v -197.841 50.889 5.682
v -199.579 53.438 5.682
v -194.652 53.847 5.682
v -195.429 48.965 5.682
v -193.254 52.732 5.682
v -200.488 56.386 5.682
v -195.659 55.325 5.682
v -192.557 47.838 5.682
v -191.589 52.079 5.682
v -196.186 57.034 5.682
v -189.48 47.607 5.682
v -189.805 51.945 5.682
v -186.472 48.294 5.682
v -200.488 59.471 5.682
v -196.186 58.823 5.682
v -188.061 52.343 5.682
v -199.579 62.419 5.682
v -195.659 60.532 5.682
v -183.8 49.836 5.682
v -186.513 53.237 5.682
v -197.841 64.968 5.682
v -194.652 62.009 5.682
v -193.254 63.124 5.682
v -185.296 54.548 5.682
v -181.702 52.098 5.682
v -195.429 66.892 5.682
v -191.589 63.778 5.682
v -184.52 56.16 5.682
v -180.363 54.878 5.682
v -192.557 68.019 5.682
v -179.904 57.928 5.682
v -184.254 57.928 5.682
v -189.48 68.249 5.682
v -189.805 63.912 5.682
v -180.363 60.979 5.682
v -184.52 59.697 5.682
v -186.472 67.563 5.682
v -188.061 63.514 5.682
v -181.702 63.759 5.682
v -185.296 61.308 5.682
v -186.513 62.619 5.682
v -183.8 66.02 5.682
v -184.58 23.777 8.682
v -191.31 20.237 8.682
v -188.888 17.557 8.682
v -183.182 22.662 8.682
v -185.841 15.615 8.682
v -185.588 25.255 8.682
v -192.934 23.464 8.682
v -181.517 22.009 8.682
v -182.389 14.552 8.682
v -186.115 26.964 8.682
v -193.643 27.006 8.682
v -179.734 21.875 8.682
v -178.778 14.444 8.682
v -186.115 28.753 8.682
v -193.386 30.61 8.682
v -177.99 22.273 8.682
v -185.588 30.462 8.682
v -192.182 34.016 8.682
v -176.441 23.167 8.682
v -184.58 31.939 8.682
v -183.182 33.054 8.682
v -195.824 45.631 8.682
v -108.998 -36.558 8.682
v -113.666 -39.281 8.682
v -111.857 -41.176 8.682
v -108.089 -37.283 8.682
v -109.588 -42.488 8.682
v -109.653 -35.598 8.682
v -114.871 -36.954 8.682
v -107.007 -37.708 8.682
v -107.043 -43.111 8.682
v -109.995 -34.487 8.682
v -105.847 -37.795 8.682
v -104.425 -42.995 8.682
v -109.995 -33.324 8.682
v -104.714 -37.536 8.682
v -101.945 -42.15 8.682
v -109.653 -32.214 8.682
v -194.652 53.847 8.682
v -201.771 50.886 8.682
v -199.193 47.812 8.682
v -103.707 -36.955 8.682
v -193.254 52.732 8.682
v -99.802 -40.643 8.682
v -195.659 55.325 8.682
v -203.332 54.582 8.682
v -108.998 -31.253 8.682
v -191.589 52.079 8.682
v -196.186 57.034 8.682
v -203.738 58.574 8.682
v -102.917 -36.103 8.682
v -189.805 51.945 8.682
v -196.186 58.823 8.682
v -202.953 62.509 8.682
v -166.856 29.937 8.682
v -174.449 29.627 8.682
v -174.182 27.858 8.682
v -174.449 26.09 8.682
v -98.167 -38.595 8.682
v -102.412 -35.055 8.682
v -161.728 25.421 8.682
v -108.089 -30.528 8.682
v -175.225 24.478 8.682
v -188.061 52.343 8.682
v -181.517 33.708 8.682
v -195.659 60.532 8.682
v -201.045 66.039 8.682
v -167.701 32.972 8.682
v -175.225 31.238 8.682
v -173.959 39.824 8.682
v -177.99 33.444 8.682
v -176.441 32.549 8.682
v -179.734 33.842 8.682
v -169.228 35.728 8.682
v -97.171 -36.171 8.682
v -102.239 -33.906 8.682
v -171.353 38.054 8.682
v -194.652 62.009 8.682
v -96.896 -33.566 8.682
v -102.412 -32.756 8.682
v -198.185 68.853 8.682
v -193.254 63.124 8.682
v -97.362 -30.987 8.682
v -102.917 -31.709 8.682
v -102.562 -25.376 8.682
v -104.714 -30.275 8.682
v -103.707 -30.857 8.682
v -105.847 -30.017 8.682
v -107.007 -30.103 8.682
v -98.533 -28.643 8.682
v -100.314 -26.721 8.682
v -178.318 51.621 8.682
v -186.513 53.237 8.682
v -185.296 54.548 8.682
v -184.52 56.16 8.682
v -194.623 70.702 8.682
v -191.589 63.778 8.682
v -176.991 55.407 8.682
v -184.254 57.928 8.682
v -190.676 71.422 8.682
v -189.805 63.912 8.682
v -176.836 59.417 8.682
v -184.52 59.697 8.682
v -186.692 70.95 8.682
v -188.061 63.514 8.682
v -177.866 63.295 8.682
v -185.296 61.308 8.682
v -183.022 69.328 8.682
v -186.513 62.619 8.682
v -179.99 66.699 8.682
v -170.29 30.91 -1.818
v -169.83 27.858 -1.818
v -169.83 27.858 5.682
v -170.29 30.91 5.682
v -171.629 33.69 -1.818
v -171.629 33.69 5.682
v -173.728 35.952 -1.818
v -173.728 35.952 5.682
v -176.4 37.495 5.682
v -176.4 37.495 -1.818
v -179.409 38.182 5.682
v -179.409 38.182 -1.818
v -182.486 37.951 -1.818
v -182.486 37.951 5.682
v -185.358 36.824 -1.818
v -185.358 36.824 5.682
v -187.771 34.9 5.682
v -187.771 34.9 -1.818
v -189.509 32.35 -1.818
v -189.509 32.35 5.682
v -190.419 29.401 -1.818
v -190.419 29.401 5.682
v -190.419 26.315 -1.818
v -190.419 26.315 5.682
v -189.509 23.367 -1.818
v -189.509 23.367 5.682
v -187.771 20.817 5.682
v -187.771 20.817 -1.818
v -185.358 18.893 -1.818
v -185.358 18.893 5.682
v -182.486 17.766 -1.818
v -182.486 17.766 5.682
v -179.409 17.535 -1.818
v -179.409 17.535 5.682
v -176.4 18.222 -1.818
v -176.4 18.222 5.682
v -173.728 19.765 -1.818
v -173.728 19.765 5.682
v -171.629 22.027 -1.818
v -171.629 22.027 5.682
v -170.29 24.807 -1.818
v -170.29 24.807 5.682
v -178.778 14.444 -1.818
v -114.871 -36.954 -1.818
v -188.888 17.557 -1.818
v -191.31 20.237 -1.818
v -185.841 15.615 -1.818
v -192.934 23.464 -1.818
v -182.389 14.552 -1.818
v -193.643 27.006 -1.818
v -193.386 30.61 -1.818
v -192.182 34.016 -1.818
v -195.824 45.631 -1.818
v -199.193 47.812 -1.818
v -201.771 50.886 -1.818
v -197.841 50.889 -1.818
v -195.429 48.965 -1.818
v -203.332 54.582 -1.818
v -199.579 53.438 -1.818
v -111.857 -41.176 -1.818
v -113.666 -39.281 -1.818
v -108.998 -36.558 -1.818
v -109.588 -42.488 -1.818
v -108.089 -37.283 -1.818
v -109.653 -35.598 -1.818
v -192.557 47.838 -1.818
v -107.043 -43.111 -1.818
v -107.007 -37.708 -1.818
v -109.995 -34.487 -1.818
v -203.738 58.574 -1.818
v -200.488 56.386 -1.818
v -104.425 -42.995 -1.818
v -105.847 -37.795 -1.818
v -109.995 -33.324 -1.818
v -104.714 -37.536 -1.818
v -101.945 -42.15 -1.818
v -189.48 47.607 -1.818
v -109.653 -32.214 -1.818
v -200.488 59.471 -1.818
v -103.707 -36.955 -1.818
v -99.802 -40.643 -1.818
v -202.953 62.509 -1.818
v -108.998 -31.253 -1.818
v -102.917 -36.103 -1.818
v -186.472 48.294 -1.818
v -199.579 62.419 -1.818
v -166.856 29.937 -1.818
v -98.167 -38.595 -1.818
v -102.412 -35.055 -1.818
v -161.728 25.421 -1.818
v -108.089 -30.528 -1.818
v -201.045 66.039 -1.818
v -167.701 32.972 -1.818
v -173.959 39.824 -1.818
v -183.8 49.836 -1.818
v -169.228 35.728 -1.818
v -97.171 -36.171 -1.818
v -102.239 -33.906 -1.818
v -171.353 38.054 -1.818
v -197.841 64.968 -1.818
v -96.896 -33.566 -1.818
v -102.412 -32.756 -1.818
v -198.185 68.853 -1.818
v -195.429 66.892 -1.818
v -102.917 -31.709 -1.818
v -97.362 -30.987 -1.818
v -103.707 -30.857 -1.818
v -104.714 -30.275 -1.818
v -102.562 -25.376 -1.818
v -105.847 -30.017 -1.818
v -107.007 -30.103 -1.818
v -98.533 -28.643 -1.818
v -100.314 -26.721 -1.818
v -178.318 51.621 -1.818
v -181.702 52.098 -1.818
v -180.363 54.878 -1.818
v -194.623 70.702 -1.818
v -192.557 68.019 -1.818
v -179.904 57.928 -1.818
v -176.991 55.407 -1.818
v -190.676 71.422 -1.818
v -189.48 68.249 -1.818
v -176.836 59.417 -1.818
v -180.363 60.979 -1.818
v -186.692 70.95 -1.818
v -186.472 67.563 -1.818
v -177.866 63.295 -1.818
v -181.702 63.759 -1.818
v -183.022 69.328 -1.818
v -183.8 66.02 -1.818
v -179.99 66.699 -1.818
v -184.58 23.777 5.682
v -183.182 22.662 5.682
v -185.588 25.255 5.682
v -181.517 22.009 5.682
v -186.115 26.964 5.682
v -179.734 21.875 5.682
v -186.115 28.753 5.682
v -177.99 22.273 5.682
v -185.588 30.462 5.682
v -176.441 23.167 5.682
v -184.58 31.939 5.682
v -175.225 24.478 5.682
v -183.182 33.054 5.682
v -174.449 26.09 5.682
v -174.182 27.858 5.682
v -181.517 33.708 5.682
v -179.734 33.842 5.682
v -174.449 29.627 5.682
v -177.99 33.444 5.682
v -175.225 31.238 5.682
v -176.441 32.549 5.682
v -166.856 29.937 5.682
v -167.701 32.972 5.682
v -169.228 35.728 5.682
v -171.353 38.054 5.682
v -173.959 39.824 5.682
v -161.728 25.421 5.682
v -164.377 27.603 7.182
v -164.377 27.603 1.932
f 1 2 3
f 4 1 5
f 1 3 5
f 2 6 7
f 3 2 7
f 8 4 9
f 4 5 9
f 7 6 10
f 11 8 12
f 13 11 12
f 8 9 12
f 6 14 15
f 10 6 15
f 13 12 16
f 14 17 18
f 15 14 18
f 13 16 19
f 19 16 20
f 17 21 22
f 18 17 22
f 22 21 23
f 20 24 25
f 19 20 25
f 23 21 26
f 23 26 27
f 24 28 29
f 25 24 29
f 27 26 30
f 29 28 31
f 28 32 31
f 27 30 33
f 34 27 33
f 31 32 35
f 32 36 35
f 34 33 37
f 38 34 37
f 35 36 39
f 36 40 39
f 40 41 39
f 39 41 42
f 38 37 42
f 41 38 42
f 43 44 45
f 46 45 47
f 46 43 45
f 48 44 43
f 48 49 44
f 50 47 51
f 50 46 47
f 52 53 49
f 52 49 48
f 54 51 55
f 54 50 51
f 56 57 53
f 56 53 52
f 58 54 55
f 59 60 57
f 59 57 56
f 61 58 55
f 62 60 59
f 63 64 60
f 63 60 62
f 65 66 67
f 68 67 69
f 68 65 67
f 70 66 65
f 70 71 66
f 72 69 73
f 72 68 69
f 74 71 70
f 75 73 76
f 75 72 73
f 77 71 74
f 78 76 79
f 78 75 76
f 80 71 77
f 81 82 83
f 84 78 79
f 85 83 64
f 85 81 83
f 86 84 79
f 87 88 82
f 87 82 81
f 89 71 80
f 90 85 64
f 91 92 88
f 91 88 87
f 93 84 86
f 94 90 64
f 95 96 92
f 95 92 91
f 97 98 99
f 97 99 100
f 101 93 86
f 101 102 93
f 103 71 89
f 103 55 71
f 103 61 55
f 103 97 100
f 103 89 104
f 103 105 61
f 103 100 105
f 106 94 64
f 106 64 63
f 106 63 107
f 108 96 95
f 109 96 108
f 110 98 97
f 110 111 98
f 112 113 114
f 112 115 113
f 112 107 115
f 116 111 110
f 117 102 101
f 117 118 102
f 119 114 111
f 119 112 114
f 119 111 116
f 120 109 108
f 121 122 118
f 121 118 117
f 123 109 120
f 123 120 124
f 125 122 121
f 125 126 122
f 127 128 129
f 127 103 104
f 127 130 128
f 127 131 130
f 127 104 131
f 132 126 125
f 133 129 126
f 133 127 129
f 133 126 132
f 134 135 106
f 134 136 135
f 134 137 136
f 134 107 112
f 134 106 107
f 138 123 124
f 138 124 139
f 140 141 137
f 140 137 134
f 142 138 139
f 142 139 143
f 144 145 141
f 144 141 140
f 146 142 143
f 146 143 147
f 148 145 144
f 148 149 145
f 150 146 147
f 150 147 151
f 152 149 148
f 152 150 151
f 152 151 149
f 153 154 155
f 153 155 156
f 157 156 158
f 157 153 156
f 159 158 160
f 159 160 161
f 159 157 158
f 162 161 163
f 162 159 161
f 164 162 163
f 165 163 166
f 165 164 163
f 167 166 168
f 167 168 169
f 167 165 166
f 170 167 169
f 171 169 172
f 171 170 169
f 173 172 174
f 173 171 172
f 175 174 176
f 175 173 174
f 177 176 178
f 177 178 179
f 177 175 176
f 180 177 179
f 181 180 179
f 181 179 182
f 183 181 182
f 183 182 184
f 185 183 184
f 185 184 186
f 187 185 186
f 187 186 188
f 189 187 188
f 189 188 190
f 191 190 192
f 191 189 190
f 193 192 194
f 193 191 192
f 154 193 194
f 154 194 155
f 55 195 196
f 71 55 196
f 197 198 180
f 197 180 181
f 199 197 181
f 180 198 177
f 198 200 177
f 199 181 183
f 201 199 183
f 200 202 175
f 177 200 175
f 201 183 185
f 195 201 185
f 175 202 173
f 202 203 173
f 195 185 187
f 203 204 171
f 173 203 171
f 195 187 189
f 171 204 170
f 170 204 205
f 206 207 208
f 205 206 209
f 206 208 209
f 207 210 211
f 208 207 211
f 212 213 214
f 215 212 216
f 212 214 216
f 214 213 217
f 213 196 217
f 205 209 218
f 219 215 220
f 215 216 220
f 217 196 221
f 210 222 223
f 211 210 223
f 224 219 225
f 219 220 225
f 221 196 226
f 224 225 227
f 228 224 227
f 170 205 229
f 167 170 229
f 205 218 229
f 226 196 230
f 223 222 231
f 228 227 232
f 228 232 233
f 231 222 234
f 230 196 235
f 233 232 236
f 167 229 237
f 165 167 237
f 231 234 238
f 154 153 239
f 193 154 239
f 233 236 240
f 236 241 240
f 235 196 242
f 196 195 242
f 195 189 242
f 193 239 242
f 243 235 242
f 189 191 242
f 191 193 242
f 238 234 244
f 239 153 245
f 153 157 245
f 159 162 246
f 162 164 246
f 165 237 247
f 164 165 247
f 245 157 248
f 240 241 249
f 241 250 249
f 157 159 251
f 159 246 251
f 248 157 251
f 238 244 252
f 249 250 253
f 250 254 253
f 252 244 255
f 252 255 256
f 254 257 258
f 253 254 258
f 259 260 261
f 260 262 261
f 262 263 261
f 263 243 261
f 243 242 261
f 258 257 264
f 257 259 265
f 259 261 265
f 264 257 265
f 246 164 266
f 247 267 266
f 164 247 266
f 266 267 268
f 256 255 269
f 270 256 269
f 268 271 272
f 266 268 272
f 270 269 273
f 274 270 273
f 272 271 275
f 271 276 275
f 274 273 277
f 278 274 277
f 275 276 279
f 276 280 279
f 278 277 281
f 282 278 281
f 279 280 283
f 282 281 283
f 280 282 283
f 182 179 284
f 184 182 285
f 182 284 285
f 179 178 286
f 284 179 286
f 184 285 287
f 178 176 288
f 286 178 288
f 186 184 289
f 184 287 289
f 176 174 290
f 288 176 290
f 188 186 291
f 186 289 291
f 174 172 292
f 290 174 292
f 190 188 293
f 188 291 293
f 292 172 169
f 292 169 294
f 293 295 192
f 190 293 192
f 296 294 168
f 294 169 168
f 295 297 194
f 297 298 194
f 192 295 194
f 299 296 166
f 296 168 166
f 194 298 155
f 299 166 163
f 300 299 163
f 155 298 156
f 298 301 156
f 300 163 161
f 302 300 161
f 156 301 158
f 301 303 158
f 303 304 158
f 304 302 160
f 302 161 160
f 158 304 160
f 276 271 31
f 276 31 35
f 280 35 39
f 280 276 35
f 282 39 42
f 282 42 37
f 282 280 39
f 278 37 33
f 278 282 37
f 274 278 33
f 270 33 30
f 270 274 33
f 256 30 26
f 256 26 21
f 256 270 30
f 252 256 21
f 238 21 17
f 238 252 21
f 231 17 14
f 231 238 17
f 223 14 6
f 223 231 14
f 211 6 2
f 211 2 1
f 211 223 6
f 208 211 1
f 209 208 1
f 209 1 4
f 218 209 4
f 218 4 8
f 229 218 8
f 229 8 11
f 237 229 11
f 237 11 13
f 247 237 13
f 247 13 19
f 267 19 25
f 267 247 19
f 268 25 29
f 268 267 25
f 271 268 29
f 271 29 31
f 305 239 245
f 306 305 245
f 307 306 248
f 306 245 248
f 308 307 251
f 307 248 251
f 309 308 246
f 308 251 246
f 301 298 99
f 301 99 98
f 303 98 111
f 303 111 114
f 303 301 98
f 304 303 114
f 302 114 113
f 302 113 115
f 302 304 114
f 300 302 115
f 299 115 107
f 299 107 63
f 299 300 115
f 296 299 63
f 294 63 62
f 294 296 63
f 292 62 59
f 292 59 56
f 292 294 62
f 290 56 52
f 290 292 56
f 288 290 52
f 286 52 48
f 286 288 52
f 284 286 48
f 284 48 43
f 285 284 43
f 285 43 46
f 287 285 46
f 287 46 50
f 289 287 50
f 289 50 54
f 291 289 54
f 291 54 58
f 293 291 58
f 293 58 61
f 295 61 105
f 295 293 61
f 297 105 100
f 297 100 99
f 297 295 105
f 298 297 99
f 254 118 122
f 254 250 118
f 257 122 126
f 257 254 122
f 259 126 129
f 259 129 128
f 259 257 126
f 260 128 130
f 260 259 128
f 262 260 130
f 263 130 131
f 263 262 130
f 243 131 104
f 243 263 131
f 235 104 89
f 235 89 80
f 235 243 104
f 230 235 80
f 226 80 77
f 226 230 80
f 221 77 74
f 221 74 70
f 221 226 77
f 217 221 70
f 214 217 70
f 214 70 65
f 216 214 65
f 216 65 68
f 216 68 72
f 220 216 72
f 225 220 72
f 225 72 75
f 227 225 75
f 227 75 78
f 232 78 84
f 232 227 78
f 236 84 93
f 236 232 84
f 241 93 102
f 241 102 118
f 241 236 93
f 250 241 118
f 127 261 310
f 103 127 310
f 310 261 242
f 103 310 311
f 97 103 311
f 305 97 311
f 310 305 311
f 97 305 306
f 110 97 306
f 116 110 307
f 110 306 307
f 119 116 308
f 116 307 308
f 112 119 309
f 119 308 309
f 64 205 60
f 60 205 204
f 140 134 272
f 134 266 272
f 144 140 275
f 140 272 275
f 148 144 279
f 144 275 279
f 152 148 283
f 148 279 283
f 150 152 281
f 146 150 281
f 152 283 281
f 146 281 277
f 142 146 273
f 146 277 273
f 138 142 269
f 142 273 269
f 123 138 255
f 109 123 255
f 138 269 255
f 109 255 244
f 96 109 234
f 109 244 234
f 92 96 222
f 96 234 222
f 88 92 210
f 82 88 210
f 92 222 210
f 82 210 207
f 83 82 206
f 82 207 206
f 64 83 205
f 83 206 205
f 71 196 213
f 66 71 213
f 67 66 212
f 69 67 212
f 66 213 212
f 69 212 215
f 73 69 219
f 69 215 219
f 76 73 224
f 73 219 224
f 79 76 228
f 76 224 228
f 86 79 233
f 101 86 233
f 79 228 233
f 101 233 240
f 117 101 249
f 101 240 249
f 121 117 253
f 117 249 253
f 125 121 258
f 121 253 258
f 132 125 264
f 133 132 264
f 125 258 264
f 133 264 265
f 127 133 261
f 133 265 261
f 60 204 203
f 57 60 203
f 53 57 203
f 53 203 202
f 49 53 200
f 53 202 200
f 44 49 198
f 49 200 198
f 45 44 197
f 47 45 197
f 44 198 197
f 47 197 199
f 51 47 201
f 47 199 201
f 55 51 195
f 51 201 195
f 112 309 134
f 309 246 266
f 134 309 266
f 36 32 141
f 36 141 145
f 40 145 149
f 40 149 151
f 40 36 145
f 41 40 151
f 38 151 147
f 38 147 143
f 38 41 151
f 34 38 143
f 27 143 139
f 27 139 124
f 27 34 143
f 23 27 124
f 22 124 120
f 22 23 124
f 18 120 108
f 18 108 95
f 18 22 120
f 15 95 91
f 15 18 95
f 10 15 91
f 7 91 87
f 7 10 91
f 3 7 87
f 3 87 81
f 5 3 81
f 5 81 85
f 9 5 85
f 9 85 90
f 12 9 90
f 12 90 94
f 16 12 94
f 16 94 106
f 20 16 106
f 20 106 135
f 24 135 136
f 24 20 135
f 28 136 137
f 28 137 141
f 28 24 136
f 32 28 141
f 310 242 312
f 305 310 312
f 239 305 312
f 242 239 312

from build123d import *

# Parameters (mm, degrees)
SKETCH1_R           = 6.901519969
SKETCH1_R_2         = 6.9
SKETCH1_R_3         = 2.6
BOSS_EXTRUDE1_DEPTH = 5
SKETCH2_R           = 4
SKETCH2_R_2         = 2.6
BOSS_EXTRUDE2_DEPTH = 2
SCALE1_SCALE        = 1.5


with BuildPart() as part:
    # Sketch1 → Boss-Extrude1 (new body)
    with BuildSketch(Plane.XY):
        with BuildLine():
            Line((-119.047770685, -14.21840763), (-158.491736924, 19.646141241))
            add(Edge.make_bspline(
                [(-158.491736924, 19.646141241), (-160.313597407, 21.050397122), (-161.909962094, 22.656519407)],
                knots=[0, 0, 0, 1, 1, 1], degree=2))
            ThreePointArc((-161.909962094, 22.656519407), (-163.491640093, 26.517106064), (-166.64545249, 29.248278339))
            Line((-166.64545249, 29.248278339), (-169.551288031, 37.112526103))
            ThreePointArc((-169.551288031, 37.112526103), (-180.421756419, 49.833075564), (-181.222431589, 33.119656379))
            Line((-181.222431589, 33.119656379), (-178.794316039, 25.37582765))
            ThreePointArc((-178.794316039, 25.37582765), (-178.212831269, 16.189990788), (-169.857983808, 12.328093938))
            Line((-169.857983808, 12.328093938), (-127.253789064, -21.937441374))
            ThreePointArc((-127.253789064, -21.937441374), (-117.207191003, -24.396487309), (-119.047770685, -14.21840763))
        make_face()
        with Locations((-170.794274728, 21.270925714)):
            Circle(SKETCH1_R, mode=Mode.SUBTRACT)
        with Locations((-177.508495403, 41.317624299)):
            Circle(SKETCH1_R_2, mode=Mode.SUBTRACT)
        with Locations((-121.432089481, -19.905045023)):
            Circle(SKETCH1_R_3, mode=Mode.SUBTRACT)
    extrude(amount=BOSS_EXTRUDE1_DEPTH)

    # Sketch2 → Boss-Extrude2 (add)
    with BuildSketch(Plane.XY.offset(5)):
        with BuildLine():
            Line((-119.047770685, -14.21840763), (-158.491736924, 19.646141241))
            add(Edge.make_bspline(
                [(-158.491736924, 19.646141241), (-160.313597387, 21.050397106), (-161.909962058, 22.656519371)],
                knots=[0, 0, 0, 1, 1, 1], degree=2))
            ThreePointArc((-161.909962058, 22.656519371), (-163.491640057, 26.517106064), (-166.64545249, 29.248278339))
            Line((-166.64545249, 29.248278339), (-169.551288031, 37.112526103))
            ThreePointArc((-169.551288031, 37.112526103), (-180.421756419, 49.833075564), (-181.222431589, 33.119656379))
            Line((-181.222431589, 33.119656379), (-178.794316039, 25.37582765))
            ThreePointArc((-178.794316039, 25.37582765), (-178.212831269, 16.189990788), (-169.857983808, 12.328093938))
            Line((-169.857983808, 12.328093938), (-127.253789064, -21.937441374))
            ThreePointArc((-127.253789064, -21.937441374), (-117.207191003, -24.396487309), (-119.047770685, -14.21840763))
        make_face()
        with Locations((-177.508495403, 41.317624299)):
            Circle(SKETCH2_R, mode=Mode.SUBTRACT)
        with Locations((-170.794274728, 21.270925714)):
            Circle(SKETCH2_R, mode=Mode.SUBTRACT)
        with Locations((-121.432089481, -19.905045023)):
            Circle(SKETCH2_R_2, mode=Mode.SUBTRACT)
    extrude(amount=BOSS_EXTRUDE2_DEPTH)


with BuildPart() as part_1:
    # Scale1: scaled about (-152.018458466, 8.096190601, 3.636452689)
    add(part.part.scale(SCALE1_SCALE).moved(Location((76.009229233, -4.0480953, -1.818226344))))


solid = part_1.part
